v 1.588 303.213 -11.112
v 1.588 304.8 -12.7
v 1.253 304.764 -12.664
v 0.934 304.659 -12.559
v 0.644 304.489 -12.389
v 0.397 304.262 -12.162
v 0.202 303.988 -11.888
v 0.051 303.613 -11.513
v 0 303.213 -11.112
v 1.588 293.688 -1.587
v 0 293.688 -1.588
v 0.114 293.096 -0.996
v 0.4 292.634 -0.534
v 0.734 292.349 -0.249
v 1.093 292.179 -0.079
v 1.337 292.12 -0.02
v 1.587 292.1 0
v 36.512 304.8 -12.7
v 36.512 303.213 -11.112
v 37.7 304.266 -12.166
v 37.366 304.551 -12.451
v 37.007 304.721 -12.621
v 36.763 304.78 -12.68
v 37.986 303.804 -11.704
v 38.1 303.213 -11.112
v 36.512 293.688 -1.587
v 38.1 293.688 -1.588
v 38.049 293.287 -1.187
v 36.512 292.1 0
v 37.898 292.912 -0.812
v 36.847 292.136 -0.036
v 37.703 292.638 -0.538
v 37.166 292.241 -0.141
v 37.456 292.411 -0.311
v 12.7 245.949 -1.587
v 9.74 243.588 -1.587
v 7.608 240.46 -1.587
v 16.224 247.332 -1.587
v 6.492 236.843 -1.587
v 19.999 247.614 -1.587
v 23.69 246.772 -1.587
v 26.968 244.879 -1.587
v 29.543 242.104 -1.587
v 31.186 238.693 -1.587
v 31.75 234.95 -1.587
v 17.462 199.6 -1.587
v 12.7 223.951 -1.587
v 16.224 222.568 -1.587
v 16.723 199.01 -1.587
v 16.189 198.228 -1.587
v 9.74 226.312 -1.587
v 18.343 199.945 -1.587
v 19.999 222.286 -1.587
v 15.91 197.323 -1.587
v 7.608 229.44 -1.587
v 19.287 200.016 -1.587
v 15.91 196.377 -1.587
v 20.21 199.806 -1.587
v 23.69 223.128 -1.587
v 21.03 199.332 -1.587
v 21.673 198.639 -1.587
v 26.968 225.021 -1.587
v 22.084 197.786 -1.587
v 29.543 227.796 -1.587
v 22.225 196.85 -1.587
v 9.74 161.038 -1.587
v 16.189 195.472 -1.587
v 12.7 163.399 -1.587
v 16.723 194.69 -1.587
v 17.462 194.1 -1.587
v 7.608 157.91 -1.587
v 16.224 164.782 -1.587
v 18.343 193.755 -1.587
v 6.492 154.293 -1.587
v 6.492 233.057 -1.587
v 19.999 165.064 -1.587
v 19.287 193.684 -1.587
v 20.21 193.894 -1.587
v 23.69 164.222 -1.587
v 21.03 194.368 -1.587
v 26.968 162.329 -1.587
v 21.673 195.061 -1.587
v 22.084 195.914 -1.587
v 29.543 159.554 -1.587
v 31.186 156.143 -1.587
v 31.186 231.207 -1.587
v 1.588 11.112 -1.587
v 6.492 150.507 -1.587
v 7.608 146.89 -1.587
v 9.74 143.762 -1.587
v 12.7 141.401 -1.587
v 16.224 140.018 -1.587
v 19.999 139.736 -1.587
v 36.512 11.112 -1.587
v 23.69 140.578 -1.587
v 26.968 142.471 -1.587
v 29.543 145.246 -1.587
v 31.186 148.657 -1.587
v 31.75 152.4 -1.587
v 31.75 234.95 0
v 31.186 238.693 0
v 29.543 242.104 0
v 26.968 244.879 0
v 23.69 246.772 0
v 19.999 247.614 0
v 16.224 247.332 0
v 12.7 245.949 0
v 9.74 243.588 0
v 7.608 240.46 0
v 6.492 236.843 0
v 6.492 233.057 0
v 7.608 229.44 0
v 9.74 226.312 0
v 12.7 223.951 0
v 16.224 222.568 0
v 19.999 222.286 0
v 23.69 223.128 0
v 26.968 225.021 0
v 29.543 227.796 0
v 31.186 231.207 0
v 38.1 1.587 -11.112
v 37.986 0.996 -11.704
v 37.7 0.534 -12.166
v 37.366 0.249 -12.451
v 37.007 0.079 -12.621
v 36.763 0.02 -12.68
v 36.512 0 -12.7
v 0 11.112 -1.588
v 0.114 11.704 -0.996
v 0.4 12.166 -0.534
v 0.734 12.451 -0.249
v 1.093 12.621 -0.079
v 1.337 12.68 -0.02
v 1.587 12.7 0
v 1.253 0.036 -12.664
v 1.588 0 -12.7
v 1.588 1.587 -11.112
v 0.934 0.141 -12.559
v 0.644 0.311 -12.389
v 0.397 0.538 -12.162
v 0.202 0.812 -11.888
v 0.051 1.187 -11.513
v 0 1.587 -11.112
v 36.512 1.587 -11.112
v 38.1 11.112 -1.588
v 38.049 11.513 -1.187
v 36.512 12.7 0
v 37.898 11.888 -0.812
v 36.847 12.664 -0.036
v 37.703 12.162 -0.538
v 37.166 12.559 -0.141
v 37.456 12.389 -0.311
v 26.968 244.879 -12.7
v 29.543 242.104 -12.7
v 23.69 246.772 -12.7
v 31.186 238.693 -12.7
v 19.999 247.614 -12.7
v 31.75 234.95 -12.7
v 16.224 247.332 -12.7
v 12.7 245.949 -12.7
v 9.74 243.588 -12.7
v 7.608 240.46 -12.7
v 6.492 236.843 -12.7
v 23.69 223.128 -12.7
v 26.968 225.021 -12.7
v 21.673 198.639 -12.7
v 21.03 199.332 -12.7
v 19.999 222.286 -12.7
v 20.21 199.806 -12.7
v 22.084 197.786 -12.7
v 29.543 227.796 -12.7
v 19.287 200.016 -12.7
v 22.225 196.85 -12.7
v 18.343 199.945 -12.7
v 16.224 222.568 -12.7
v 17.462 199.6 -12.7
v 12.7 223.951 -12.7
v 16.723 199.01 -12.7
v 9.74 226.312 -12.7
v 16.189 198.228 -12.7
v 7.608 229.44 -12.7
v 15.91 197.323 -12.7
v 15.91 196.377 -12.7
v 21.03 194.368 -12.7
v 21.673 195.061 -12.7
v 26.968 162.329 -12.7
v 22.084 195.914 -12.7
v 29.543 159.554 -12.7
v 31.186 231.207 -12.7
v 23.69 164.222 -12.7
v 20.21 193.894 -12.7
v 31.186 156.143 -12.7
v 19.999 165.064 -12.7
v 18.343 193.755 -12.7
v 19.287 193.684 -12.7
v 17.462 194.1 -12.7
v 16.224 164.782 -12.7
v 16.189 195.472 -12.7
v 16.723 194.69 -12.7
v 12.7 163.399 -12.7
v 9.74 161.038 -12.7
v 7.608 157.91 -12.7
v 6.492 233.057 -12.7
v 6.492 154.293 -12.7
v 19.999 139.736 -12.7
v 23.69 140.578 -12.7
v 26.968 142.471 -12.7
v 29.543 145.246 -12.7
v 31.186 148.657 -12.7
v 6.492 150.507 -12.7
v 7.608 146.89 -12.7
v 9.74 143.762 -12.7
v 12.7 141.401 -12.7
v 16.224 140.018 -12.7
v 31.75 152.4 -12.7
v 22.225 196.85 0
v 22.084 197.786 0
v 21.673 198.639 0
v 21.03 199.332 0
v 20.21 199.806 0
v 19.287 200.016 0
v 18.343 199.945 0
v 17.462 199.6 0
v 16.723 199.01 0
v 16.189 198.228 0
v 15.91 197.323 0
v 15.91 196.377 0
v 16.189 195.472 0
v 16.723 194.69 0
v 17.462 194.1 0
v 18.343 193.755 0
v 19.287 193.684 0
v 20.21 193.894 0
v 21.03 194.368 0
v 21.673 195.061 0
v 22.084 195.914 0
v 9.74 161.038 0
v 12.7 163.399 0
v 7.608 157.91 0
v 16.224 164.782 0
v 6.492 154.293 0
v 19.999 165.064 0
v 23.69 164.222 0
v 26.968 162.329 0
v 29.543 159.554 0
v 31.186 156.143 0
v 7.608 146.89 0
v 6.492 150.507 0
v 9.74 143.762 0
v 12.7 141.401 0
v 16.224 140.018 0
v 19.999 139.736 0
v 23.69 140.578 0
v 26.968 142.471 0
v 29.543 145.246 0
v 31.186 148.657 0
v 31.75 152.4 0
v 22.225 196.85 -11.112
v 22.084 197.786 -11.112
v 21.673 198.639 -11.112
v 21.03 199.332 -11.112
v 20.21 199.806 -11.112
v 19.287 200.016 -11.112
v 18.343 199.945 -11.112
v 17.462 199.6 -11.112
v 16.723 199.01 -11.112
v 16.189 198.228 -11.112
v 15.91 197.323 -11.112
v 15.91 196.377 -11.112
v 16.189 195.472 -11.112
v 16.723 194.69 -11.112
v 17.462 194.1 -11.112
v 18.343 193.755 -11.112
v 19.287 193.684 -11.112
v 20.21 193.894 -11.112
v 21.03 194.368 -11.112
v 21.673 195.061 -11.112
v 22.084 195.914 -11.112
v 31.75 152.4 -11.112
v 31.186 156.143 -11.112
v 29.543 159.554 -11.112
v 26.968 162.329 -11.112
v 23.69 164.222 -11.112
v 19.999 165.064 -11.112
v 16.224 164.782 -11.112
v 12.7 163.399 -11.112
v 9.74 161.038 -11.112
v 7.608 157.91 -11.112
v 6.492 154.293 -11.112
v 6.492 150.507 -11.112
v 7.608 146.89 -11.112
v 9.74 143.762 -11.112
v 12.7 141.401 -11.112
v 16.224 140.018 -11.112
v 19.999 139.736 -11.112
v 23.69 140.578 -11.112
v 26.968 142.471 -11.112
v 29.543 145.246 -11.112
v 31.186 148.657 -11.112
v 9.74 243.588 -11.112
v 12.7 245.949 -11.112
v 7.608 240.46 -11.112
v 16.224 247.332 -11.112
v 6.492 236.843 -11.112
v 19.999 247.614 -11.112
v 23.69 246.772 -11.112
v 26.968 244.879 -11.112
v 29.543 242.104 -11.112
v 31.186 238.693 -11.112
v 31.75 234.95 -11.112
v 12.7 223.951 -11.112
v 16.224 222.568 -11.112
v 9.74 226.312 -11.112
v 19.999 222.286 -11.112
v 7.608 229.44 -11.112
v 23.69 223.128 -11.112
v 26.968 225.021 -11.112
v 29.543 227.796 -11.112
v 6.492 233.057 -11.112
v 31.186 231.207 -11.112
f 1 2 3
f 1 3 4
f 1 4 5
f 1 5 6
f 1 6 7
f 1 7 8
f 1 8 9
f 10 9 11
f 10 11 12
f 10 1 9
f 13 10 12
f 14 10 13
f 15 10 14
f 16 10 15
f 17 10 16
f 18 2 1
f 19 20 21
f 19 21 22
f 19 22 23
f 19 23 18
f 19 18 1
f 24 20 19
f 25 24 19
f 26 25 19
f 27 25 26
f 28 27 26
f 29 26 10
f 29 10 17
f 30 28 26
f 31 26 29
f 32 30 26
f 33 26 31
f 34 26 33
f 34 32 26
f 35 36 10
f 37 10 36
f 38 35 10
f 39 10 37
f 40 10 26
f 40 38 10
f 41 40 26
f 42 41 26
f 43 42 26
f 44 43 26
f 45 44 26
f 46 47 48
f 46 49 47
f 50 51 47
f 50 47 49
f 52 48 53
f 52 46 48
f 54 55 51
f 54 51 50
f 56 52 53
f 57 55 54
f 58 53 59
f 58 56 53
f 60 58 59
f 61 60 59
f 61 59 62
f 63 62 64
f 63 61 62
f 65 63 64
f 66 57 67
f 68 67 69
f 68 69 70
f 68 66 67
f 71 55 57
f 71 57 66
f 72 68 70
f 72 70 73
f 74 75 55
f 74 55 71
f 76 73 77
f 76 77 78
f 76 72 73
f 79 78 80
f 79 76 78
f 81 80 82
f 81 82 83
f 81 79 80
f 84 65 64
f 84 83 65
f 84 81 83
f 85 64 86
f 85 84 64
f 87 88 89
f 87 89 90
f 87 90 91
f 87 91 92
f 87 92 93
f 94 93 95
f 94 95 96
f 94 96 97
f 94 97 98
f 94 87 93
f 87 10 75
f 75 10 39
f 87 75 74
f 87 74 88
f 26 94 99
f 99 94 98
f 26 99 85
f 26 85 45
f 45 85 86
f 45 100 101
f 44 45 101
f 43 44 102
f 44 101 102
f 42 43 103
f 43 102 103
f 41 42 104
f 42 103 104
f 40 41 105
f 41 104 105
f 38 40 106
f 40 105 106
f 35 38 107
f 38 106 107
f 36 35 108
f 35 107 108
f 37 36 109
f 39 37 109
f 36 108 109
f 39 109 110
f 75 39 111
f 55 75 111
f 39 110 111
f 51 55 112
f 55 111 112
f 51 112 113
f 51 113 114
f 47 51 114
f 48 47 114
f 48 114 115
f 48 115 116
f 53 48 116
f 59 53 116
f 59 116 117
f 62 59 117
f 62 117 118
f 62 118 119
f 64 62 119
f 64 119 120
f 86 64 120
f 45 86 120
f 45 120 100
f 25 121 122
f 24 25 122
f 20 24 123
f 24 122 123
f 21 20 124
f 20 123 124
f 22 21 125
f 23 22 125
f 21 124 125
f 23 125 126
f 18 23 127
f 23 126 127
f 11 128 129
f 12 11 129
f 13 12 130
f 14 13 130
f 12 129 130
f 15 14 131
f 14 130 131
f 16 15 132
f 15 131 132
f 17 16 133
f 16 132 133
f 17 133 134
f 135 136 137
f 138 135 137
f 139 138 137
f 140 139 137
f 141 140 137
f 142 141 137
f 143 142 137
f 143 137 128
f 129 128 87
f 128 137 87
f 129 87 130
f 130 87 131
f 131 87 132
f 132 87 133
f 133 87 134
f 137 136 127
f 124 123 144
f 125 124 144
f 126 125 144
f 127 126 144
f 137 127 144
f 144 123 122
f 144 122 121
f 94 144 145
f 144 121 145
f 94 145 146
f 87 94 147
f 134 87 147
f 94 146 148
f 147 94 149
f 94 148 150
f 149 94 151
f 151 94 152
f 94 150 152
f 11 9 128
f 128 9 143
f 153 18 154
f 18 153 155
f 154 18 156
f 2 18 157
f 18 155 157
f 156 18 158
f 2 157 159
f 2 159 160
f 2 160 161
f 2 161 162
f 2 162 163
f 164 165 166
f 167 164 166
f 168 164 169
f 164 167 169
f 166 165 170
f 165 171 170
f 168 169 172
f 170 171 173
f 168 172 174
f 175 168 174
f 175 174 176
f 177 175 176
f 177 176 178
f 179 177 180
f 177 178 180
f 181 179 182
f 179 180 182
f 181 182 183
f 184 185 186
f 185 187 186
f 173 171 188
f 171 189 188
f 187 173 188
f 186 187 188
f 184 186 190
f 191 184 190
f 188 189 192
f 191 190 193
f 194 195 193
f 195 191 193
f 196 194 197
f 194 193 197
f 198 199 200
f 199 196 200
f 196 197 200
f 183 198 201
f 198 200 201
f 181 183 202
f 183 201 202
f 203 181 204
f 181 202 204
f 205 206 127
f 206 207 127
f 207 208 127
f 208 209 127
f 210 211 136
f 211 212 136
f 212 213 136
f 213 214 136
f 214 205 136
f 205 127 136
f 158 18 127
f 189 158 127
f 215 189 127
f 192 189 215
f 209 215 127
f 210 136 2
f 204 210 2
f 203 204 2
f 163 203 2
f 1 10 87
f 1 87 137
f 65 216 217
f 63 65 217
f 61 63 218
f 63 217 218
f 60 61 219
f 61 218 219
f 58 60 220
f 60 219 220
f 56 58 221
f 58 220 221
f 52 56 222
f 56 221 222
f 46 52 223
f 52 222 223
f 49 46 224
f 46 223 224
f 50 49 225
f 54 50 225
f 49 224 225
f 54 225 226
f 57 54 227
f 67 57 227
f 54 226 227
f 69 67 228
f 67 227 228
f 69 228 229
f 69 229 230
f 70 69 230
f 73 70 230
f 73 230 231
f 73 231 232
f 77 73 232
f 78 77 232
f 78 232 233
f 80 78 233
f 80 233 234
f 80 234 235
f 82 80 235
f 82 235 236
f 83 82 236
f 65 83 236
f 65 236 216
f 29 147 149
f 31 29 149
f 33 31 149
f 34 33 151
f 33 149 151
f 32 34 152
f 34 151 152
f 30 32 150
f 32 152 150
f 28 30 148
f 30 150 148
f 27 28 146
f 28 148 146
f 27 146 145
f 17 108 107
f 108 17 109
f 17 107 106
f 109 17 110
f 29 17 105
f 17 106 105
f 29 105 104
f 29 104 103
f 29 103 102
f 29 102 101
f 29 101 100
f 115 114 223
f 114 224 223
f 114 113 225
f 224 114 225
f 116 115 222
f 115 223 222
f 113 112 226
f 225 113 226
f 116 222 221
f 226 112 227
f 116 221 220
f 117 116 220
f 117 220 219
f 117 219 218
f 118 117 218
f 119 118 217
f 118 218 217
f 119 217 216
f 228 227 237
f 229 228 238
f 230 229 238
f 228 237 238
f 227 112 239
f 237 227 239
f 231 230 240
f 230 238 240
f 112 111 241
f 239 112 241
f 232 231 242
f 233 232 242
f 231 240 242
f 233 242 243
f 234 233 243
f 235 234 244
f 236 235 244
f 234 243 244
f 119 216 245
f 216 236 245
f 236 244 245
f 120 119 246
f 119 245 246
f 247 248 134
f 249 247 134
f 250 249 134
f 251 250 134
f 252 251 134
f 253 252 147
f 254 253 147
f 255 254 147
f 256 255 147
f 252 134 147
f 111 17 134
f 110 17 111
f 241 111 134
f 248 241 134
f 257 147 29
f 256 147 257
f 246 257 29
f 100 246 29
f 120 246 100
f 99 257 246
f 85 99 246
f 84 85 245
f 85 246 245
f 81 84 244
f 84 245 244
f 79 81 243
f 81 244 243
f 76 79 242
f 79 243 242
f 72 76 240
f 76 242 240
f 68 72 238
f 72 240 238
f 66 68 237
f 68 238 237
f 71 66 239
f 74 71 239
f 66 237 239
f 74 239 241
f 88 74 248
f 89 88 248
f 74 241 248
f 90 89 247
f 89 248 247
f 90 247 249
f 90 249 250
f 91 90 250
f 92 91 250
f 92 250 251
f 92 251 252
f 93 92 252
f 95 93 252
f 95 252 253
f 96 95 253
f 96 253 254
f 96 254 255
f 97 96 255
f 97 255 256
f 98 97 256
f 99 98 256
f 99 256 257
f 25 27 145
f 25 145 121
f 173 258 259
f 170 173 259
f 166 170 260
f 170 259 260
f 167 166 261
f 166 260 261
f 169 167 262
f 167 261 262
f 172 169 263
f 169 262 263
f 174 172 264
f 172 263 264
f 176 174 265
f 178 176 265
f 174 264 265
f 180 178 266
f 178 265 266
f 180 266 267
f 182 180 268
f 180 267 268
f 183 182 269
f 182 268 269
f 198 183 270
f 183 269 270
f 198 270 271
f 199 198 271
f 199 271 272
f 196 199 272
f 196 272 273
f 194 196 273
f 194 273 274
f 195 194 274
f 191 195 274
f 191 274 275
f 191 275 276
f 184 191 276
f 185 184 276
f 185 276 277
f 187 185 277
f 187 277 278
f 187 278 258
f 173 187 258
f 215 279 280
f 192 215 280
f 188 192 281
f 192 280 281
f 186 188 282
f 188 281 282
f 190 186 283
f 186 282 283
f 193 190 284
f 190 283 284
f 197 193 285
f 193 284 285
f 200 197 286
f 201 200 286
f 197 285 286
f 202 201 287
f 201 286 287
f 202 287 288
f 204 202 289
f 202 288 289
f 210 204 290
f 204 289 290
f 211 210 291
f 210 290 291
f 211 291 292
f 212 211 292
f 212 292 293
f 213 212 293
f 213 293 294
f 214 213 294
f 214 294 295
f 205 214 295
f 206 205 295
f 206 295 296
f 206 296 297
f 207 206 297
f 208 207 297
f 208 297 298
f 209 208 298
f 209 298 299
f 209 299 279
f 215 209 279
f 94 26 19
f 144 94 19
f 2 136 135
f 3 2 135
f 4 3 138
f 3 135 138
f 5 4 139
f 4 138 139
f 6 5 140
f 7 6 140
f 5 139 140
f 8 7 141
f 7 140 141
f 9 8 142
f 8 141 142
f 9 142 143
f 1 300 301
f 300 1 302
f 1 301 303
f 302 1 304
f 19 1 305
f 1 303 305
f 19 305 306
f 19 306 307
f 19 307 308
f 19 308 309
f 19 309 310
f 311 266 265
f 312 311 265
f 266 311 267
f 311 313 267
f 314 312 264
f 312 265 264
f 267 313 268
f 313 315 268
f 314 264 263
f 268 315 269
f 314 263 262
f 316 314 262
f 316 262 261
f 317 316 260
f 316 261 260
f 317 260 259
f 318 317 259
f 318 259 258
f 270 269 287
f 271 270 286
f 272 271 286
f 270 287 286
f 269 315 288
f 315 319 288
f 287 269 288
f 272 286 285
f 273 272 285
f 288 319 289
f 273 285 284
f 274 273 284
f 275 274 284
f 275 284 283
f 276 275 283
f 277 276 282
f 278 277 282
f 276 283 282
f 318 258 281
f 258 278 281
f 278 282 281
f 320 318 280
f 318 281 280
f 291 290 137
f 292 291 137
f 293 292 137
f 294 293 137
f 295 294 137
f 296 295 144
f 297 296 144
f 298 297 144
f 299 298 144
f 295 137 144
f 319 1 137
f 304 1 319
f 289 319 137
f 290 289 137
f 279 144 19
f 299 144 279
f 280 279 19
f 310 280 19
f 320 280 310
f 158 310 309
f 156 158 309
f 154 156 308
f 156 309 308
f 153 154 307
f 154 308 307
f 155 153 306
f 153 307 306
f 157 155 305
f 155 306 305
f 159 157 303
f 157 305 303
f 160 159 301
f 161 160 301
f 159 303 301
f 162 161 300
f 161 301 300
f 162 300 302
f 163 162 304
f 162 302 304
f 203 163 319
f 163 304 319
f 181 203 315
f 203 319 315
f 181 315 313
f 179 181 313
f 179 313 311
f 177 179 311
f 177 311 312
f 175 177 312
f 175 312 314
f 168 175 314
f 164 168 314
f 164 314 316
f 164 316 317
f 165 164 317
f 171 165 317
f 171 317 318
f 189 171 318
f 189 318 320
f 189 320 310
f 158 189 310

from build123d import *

# Parameters (mm, degrees)
SKETCH1_W           = 34.925
SKETCH1_H           = 9.525
BOSS_EXTRUDE1_DEPTH = 304.8
SKETCH2_R           = 12.7
SKETCH2_R_2         = 3.175
CUT_EXTRUDE1_DEPTH  = 13.7
CUT_EXTRUDE2_DEPTH  = 39.1


with BuildPart() as part:
    # Sketch1 → Boss-Extrude1 (new body)
    with BuildSketch(Plane(origin=(0, 0, 0), x_dir=(1, 0, 0), z_dir=(0, 1, 0))):
        with BuildLine():
            Line((1.5875, 0), (36.5125, 0))
            ThreePointArc((36.5125, 0), (37.635032015, 0.464967985), (38.1, 1.5875))
            Line((38.1, 1.5875), (38.1, 11.1125))
            ThreePointArc((38.1, 11.1125), (37.635032015, 12.235032015), (36.5125, 12.7))
            Line((36.5125, 12.7), (1.5875, 12.7))
            ThreePointArc((1.5875, 12.7), (0.464967985, 12.235032015), (0, 11.1125))
            Line((0, 11.1125), (0, 1.5875))
            ThreePointArc((0, 1.5875), (0.464967985, 0.464967985), (1.5875, 0))
        make_face()
        with Locations((19.05, 6.35)):
            Rectangle(SKETCH1_W, SKETCH1_H, mode=Mode.SUBTRACT)
    extrude(amount=BOSS_EXTRUDE1_DEPTH)

    # Sketch2 → Cut-Extrude1 (cut, through all)
    with BuildSketch(Plane.XY):
        with Locations((19.05, 152.4)):
            Circle(SKETCH2_R)
        with Locations((19.05, 196.85)):
            Circle(SKETCH2_R_2)
        with Locations((19.05, 234.95)):
            Circle(SKETCH2_R)
    extrude(amount=-CUT_EXTRUDE1_DEPTH, mode=Mode.SUBTRACT)

    # Sketch3 → Cut-Extrude2 (cut, through all)
    with BuildSketch(Plane(origin=(38.1, 0, 0), x_dir=(0, 0, -1), z_dir=(1, 0, 0))):
        Polygon((0, 0), (12.7, 0), (0, 12.7), align=None)
        Polygon((0, 304.8), (12.7, 304.8), (0, 292.1), align=None)
    extrude(amount=-CUT_EXTRUDE2_DEPTH, mode=Mode.SUBTRACT)


solid = part.part
